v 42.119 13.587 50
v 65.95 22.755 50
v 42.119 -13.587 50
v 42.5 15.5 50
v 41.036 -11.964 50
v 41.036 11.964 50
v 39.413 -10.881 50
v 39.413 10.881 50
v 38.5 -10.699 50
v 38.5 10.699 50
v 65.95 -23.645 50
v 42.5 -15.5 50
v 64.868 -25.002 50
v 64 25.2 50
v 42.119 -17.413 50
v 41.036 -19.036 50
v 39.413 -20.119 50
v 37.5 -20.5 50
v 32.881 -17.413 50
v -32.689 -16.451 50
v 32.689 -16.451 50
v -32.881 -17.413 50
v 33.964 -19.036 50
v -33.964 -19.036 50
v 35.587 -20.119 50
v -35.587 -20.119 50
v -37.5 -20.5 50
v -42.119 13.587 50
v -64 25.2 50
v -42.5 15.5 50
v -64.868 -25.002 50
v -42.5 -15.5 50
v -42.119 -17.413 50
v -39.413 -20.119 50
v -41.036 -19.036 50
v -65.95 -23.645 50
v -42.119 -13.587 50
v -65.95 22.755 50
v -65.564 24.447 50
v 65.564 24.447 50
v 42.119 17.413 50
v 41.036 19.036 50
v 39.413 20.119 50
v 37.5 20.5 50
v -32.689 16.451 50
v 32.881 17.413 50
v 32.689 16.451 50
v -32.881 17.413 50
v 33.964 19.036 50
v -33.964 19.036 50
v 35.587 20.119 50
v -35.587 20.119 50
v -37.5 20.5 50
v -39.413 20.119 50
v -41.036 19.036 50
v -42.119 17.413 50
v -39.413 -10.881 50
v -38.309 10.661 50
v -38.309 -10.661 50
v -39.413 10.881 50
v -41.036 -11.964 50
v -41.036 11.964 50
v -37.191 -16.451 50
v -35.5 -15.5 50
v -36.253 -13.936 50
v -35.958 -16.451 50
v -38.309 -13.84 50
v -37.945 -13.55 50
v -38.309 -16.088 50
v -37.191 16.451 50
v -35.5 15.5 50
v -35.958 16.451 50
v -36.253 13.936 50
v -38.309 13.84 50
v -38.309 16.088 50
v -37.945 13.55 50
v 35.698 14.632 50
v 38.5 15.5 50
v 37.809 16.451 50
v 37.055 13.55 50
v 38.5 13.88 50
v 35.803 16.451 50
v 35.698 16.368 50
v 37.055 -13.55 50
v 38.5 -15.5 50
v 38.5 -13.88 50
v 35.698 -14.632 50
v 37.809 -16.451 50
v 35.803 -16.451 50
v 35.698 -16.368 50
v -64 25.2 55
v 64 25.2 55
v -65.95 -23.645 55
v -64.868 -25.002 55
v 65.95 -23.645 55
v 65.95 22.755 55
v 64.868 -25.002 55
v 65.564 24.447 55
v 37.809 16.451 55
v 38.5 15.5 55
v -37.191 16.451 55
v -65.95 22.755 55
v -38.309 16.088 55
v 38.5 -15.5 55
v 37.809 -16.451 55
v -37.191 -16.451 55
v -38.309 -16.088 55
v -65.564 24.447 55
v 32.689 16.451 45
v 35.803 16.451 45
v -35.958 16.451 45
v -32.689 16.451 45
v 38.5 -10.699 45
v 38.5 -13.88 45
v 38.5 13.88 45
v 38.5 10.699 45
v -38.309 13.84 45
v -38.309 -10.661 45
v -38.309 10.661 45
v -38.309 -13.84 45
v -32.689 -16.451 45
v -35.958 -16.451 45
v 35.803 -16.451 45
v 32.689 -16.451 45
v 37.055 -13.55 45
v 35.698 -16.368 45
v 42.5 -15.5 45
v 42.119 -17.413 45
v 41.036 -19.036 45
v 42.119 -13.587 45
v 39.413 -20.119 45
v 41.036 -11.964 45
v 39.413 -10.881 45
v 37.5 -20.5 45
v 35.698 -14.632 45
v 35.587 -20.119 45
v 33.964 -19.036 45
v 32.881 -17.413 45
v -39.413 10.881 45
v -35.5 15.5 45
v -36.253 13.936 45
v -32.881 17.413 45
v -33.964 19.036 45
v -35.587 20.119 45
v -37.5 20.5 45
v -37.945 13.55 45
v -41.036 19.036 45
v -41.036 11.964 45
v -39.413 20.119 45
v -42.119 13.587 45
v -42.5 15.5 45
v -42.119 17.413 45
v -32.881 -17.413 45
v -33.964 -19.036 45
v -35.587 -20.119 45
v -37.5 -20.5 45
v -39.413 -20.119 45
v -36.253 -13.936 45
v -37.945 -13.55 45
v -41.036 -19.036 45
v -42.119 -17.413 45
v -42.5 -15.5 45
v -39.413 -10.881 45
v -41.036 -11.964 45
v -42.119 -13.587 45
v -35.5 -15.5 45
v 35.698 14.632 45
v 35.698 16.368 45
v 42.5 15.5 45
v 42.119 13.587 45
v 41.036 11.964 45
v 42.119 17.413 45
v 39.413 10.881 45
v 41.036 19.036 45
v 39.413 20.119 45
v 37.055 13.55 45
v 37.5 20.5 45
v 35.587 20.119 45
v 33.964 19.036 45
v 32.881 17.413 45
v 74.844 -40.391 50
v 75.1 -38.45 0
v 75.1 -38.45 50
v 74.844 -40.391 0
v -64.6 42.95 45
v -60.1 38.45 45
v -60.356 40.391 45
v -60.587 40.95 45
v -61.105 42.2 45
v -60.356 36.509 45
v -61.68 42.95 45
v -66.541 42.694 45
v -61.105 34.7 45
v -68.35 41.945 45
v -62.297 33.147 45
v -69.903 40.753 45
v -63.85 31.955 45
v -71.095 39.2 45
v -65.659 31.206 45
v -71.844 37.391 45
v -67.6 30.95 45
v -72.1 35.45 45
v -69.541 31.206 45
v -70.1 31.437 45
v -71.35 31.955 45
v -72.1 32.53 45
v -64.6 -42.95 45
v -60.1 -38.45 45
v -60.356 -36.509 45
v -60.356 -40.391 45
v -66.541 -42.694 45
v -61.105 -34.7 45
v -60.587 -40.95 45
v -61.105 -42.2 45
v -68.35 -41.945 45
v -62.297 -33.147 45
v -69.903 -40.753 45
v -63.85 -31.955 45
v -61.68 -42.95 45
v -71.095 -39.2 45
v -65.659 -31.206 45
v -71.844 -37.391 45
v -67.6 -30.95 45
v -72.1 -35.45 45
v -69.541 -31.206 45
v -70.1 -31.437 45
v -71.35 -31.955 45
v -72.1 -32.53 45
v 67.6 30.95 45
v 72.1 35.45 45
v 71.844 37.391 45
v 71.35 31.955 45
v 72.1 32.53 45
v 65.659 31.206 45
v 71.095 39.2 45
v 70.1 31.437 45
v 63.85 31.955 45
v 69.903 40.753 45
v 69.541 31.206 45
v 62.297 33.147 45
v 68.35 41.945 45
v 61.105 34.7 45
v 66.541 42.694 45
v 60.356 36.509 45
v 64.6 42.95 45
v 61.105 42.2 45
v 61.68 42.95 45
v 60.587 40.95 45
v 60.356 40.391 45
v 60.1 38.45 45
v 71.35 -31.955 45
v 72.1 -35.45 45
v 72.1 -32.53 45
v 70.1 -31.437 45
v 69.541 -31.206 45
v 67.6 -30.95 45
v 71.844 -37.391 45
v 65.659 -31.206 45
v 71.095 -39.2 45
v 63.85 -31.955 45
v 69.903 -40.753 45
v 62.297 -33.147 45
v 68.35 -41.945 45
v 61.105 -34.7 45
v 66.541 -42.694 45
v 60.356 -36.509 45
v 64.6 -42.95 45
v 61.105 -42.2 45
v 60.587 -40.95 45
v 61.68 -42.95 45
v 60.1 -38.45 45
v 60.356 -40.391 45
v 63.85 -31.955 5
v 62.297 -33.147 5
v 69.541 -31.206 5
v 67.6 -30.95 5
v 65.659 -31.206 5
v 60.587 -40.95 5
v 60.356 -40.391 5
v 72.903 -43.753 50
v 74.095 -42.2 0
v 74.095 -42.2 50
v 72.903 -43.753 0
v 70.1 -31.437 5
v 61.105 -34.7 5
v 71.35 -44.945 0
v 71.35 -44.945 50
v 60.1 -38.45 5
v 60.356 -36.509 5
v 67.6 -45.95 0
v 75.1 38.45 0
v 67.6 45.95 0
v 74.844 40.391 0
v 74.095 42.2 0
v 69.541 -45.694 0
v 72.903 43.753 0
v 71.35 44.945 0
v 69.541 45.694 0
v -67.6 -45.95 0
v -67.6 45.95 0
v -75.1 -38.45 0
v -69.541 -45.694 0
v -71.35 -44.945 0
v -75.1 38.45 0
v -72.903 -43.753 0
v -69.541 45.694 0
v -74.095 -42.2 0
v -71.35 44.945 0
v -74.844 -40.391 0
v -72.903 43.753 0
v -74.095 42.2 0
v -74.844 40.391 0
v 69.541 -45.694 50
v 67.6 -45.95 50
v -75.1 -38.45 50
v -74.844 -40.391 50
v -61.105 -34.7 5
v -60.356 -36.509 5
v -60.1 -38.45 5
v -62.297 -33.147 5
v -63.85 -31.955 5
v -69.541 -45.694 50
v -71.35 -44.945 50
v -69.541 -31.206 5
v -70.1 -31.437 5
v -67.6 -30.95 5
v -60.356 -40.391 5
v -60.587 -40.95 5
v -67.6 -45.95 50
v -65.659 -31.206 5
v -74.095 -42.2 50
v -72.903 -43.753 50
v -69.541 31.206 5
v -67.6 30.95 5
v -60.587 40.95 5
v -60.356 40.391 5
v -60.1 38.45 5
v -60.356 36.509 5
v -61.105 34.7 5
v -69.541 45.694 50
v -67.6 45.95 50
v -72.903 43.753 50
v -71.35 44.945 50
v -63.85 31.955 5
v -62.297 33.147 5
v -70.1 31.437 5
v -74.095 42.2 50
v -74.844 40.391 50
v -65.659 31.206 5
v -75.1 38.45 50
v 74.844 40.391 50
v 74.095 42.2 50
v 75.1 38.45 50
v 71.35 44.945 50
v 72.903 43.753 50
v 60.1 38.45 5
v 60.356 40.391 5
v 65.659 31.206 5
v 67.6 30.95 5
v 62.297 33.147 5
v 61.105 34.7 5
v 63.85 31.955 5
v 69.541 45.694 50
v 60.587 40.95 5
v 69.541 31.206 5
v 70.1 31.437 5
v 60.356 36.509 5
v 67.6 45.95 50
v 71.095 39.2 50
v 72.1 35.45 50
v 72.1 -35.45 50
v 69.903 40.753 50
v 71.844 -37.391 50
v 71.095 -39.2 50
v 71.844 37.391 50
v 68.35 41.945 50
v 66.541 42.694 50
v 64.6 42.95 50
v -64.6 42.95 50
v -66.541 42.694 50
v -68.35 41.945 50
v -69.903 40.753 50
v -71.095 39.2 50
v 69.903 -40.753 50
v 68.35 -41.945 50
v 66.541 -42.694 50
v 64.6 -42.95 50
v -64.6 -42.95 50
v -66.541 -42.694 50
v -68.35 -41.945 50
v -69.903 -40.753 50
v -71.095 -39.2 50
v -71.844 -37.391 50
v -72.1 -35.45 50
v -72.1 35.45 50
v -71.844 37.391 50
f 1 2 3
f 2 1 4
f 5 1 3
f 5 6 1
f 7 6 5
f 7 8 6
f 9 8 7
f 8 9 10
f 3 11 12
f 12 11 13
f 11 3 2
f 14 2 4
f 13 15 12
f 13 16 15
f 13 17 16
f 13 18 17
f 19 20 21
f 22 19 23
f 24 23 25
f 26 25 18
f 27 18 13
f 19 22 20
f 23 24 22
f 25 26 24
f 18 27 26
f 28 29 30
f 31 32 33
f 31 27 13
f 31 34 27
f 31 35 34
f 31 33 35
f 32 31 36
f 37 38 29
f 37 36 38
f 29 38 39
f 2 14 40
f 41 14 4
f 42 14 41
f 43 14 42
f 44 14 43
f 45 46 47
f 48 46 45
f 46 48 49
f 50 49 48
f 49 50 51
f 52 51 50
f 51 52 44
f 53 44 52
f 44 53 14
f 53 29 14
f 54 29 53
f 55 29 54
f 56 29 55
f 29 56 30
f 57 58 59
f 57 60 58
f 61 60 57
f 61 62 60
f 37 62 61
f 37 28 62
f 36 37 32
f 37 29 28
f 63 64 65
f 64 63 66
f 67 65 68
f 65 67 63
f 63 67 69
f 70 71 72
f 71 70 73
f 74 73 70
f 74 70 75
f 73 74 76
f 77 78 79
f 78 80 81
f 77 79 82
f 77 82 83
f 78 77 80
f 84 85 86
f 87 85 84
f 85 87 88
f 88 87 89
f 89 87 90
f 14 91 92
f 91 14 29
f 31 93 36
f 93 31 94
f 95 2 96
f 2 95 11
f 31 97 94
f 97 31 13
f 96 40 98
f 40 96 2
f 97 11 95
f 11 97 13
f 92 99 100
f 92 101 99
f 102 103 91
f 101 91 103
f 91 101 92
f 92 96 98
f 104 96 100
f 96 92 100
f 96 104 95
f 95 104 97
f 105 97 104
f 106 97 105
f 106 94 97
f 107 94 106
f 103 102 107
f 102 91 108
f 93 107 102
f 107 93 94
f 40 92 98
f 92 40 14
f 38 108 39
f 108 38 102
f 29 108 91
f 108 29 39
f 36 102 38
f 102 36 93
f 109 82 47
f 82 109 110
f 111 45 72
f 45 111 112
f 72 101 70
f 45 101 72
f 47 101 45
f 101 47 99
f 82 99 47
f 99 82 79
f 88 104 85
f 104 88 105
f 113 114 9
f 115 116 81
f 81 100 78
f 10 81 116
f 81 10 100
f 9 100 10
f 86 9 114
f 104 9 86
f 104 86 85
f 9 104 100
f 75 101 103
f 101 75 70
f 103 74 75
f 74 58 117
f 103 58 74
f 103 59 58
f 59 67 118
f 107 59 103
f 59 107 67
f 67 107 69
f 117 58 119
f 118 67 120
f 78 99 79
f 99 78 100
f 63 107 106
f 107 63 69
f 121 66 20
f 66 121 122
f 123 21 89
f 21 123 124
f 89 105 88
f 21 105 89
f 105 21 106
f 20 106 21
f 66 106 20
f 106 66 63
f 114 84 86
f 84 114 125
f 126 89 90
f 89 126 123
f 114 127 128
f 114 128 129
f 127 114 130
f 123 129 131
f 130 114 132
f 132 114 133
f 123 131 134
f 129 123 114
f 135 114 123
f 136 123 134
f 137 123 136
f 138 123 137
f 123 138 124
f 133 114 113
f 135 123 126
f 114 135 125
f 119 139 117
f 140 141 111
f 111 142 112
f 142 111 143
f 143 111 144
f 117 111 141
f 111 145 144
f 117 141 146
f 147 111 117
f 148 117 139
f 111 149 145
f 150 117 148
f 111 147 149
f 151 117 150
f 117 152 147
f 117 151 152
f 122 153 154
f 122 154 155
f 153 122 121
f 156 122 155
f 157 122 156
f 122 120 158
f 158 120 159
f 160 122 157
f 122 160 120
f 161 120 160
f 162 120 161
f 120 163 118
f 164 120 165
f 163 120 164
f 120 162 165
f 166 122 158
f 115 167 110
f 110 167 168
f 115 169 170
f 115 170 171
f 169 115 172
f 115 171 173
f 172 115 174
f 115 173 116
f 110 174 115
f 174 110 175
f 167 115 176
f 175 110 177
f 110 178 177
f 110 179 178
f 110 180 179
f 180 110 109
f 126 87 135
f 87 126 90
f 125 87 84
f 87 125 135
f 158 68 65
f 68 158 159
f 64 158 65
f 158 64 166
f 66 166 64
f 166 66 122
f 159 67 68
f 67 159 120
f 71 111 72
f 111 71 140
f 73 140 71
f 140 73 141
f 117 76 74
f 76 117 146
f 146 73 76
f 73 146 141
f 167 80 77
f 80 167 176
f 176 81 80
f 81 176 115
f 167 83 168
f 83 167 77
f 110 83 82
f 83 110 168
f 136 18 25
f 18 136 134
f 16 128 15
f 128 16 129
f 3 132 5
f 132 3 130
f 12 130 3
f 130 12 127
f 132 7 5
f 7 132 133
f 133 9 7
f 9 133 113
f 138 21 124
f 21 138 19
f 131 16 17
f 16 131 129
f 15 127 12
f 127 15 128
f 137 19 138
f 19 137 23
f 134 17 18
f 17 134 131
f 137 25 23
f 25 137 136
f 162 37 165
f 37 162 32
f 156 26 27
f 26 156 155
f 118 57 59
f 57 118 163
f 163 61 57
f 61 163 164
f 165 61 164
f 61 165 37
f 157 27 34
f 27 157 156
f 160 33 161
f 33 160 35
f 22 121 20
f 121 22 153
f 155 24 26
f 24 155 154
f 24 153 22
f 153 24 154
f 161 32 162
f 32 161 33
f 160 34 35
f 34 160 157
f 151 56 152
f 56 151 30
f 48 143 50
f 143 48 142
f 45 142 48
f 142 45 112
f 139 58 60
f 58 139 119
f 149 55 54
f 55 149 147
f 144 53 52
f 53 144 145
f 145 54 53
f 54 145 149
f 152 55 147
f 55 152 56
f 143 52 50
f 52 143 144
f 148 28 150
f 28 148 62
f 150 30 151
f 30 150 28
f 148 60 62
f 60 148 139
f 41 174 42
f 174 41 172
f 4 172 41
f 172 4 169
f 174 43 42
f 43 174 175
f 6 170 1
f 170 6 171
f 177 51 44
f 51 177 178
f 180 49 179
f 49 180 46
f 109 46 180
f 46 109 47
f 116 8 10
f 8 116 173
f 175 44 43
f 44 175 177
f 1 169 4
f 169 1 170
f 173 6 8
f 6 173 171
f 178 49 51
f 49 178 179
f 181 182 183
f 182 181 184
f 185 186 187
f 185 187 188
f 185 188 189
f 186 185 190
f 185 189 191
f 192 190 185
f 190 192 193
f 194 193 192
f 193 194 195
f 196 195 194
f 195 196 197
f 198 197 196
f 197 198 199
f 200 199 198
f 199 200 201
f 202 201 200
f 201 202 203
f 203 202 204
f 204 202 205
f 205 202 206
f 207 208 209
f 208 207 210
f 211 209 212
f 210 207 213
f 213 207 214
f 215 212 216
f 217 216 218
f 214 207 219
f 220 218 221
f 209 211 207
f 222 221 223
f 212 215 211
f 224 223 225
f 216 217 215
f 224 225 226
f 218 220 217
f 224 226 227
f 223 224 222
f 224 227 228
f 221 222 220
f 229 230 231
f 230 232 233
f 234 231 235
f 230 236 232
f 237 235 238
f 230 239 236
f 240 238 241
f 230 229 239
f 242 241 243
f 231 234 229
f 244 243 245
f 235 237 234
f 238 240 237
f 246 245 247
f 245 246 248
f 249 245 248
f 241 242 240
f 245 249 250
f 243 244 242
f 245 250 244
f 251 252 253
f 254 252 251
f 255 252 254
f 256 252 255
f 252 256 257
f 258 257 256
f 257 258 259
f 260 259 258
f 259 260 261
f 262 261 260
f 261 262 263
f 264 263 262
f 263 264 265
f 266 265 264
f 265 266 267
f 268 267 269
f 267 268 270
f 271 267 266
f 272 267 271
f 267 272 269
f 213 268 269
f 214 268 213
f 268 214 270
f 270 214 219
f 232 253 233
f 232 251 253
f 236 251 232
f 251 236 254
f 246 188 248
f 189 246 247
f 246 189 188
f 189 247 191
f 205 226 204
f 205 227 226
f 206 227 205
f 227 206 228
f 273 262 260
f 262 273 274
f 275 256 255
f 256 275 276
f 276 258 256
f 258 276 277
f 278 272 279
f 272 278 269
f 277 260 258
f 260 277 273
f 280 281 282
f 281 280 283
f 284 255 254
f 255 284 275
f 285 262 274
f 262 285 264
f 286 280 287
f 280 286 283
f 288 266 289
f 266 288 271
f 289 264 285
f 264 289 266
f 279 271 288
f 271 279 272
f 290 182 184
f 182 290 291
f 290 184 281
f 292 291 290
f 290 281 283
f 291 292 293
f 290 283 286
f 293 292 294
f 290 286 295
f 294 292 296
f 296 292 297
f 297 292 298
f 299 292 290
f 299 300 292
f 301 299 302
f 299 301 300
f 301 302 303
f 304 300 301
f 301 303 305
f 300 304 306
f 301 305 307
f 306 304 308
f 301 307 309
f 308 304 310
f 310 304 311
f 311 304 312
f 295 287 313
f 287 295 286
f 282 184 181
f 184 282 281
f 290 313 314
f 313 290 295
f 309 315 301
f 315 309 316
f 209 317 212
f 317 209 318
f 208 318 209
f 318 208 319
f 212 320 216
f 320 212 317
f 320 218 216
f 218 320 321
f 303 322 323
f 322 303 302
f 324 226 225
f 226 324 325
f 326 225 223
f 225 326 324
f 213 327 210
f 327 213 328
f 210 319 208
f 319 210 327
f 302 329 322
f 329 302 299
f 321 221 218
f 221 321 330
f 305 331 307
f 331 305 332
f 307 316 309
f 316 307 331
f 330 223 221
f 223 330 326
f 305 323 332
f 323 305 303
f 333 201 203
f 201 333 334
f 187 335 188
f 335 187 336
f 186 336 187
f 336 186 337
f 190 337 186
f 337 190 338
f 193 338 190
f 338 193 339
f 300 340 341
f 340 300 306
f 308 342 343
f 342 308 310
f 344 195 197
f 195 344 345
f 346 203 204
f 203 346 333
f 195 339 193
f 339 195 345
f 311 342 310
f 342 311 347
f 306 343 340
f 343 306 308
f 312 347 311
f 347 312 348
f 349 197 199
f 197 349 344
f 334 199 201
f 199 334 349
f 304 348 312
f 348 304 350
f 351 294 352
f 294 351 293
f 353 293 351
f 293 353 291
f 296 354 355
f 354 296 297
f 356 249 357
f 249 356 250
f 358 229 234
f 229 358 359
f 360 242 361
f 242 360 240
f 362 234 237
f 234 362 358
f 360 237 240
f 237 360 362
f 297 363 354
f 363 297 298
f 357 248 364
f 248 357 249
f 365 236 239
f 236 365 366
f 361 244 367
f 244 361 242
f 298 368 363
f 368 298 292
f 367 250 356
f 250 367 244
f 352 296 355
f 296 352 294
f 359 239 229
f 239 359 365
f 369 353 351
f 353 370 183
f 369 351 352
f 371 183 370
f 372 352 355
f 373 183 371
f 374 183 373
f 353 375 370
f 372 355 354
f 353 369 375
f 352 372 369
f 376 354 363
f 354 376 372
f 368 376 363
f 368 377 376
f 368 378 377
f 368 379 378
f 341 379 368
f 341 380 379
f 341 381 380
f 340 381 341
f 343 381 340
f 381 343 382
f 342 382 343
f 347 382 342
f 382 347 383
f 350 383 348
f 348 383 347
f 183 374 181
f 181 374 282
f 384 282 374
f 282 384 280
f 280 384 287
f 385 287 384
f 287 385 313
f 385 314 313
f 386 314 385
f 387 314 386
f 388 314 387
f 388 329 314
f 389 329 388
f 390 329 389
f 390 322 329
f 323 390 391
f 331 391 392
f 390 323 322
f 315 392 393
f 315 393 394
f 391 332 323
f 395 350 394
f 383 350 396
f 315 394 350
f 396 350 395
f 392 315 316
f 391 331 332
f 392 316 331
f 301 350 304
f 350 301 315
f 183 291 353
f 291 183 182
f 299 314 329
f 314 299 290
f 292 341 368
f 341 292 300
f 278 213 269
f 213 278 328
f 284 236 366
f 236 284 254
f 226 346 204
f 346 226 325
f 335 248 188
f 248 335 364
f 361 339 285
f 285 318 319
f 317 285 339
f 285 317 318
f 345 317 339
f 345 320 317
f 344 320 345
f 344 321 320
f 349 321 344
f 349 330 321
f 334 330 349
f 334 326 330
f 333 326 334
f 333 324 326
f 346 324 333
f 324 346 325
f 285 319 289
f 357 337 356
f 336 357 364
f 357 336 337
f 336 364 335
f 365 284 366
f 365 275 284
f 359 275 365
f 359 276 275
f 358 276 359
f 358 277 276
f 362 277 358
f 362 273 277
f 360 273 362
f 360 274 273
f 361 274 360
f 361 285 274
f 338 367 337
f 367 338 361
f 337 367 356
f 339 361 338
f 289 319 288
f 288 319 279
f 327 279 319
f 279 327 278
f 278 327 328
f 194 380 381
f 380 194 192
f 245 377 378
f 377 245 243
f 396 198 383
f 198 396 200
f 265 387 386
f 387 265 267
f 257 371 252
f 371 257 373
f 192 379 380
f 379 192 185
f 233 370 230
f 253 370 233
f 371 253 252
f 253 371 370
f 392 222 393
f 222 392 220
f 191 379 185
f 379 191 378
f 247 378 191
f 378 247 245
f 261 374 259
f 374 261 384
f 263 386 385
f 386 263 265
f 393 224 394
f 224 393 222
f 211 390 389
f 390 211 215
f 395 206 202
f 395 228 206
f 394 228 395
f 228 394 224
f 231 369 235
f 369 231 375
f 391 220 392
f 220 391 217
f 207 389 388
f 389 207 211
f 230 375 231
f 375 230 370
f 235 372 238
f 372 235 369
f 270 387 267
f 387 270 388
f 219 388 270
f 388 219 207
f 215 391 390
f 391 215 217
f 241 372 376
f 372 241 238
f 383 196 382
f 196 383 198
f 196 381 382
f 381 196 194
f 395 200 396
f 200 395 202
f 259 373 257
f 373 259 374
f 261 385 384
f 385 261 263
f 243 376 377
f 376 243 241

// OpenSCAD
// file: lcd_mount.scad
include <dimensions.scad>
include <posts.scad>

module lcd_cut() {
        difference() {
        children()
		cube([ lcd_x, lcd_y, box_z ], center = true); 
    }
}


module lcd_posts (
            x =  lcd_holex_x / 2,
			y = lcd_holes_y /2 ,
			z = lid_bottom,
			h,
            r,
            center
			) {
			posts(
            x=x, y=y, z=z, h=h, r=r,
			center=center
		);
}

module lcd_mount() {

    module lcd_cut() {
        hull()
        lcd_posts(r=1, h=50, center=true);
    }
    
	difference(){
		rotate(90)
		hull()
		lcd_posts(
		x= lcd_x,
		y= lcd_y,
		z = box_z,
		h=5,
		r= 2,
        center=false
		);
		lcd_cut();
	}
        lcd_posts(r=2, h=5, center=true);
        difference() {
        //mounting posts
        lcd_posts(r=5, h=5, center=true);
		lcd_cut();
        //mounting holes
        }
  }

  lcd_mount();
// file: posts.scad
//	   A	
//  |-----|
//D |     | B
//  |-----|
//	   C

//usage:
//posts(x=100, y=50, z=50, h=25, r=10, center=true);


module posts (x,y,z,h,r, center=false) {

	a = center ? [x, -y, z] : [x-r, -y+r, z];
	b = center ? [-x, -y, z] :  [-x+r, -y+r , z];
	c = center ? [-x, y, z] : [-x+r, y-r ,z];
	d = center ?  [x, y, z] : [x-r, y-r ,z];
	
			translate(a)
			cylinder(h=h,r=r);
			translate(b)
			cylinder(h=h,r=r);
			translate(c)
			cylinder(h=h,r=r);
			translate(d)
			cylinder(h=h,r=r);
}
// file: dimensions.scad
keypad_x = 69.2;
keypad_y = 76.9;
keypad_z = 2;
keypad_radius = 10;

lcd_y = 66;
lcd_x = 25.2;
lcd_z = 2;
lcd_holex_x = 75;
lcd_holes_y = 31;

rfid_s = 41;

space = 30;
box_x = keypad_x + lcd_y + space;
box_y = max(keypad_y, lcd_y) + space;

box_z =  50;
wall_thickness = 5;
radius = 7.5;

lid_thickness = 5;
lid_lip = 3;

lid_bottom = box_z - lid_thickness;
// main file
include <dimensions.scad>
include <posts.scad>
include <lcd_mount.scad>

module postsHoles () {
	posts(
		x=(box_x /2) -radius,
		y=(box_y /2) -radius,
		z=wall_thickness,
		h=box_z,
		r=3
	);
}


module box (x,y,z,h,r) {
	hull()  posts(x,y,z,h,r);
}

module boxLid () {
	box(
			x=(box_x /2) -radius - lid_lip,
			y=(box_y /2) -radius - lid_lip,
			z= lid_bottom,
			h= lid_thickness,
			r= radius
			);
}


//box
union () {

//posts
		posts(
			x=(box_x /2) -radius ,
			y=(box_y /2) -radius ,
			z=0,
			h=lid_bottom,
			r=radius
		);
        	

	
	difference(){	
		box(
			x=(box_x /2) -radius,
			y=(box_y /2) -radius, 
			z=0,
			h=box_z,
			r=radius
			);

		box(
			x=(box_x /2)-radius - wall_thickness,
			y=(box_y /2 )-radius - wall_thickness, 
			z=wall_thickness,
			h=box_z,
			r=radius
			);
		boxLid(); 	//lip cut
		// postsHoles();
	}


}





//    <  lcd   >
// --------------
// --          -- ^
// --          -- 
// -------------- v
// --          -- 
// --          -- ^
// --          -- 
// --          -- v
// --------------
//    < keypad  >

// lid
* union() {
        difference() {
            boxLid();
            postsHoles();
			rotate(90)

            //keypad cut
            translate([-space + 5, 0, 0])
            box(
                x = keypad_x / 2,
                y = keypad_y / 2,
                z = lid_bottom + lid_thickness - keypad_z + 0.1,
                r = keypad_radius,
                h= keypad_z
            );
            //keypad cable cut
            translate([-keypad_x,0,lid_bottom])
            cube([3,15,15], center=true);
        }

        // posts for rfid interior mount
            mount_posts_h = 6;
            translate([-(keypad_x / 2), 0,lid_bottom - mount_posts_h])
        difference() {
            posts(
                    x=(rfid_s / 2),
                    y=(rfid_s / 2),
                    z=0,
                    h=mount_posts_h,
                    r=mount_posts_h
            );
            posts(
                    x=(rfid_s / 2),
                    y=(rfid_s / 2),
                    z=0,
                    h=mount_posts_h,
                    r=3

            );
        }
    }
